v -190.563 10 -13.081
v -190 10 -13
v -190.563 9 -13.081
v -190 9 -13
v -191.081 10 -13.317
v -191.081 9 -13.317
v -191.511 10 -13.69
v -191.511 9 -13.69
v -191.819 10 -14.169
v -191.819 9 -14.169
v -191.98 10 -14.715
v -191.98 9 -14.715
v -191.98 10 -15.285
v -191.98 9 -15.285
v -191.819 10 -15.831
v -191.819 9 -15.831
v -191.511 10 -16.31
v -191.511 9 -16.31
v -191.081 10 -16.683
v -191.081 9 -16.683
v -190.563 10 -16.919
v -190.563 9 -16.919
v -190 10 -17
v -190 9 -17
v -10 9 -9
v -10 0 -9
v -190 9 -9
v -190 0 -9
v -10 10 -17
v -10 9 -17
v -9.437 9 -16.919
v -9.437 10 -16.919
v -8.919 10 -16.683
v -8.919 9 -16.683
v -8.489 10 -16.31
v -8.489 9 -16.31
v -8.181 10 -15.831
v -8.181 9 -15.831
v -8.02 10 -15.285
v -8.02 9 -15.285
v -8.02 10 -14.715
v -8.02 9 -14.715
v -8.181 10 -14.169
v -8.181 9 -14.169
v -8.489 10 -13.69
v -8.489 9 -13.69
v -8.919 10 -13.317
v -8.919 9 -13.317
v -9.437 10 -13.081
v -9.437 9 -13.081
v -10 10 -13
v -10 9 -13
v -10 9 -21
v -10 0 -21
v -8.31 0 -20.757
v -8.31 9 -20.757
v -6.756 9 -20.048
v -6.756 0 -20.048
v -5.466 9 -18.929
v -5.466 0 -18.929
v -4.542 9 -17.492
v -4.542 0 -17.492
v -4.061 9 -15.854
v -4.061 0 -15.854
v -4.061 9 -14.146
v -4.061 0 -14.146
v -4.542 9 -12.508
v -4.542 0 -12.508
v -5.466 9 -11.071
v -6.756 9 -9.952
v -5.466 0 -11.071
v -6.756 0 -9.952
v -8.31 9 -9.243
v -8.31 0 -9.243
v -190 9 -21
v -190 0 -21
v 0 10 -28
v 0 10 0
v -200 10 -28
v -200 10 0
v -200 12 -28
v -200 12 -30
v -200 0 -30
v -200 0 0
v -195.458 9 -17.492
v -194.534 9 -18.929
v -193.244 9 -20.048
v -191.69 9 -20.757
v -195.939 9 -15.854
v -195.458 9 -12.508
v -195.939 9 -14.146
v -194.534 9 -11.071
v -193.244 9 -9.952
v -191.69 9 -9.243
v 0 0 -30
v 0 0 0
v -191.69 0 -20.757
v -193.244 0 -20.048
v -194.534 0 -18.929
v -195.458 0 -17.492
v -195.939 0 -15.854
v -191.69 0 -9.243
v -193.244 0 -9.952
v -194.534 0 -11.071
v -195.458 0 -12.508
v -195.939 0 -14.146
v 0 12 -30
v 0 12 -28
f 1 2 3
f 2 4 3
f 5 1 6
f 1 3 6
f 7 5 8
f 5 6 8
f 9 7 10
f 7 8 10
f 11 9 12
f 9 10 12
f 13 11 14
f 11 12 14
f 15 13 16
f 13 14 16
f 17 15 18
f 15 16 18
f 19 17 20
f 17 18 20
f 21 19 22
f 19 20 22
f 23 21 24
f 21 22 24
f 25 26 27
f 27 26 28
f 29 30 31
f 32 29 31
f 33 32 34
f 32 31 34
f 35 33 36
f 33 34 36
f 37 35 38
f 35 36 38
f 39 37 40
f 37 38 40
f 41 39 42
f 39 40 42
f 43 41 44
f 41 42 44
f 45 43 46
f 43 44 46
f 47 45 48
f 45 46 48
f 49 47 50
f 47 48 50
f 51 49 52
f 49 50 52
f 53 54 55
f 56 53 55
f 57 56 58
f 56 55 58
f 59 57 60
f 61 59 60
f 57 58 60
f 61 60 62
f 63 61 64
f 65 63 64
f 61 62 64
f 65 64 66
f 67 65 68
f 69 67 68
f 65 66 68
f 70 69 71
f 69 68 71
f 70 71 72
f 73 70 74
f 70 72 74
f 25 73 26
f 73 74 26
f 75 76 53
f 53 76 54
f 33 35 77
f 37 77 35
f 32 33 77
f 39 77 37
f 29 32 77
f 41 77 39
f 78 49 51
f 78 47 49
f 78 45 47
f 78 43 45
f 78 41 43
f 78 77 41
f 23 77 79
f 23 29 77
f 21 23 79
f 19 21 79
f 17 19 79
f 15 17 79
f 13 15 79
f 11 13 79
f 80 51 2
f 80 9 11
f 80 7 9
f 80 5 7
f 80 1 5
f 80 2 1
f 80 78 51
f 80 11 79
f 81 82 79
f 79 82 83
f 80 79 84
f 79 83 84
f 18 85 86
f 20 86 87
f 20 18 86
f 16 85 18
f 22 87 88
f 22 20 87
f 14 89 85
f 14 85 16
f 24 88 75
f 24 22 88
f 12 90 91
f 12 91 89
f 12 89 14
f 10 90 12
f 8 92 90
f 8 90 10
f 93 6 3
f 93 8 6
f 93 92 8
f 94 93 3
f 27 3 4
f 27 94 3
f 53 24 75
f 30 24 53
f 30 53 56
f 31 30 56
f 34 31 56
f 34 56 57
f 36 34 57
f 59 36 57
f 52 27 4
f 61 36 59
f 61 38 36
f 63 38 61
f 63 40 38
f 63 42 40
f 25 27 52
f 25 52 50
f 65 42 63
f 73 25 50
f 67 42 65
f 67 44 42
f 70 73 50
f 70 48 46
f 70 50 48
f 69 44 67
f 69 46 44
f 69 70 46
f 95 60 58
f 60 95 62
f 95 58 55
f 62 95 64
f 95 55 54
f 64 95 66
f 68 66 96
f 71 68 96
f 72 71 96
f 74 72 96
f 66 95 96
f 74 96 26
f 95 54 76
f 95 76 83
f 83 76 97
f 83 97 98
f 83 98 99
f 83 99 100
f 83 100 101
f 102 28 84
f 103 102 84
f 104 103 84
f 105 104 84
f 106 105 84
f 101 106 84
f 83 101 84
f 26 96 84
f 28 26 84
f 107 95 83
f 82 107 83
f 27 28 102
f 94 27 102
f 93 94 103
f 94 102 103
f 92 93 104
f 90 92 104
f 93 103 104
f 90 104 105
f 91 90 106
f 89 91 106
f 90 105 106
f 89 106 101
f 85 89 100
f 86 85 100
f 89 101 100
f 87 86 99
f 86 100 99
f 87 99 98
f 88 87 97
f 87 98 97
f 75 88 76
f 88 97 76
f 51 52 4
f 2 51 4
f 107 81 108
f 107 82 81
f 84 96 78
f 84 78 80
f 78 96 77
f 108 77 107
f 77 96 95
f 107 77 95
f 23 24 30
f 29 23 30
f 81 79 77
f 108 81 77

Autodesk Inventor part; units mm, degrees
ref_plane "YZ Plane" through (0, 0, 0) normal (1, 0, 0) x (0, 1, 0)
ref_plane "XZ Plane" through (0, 0, 0) normal (0, 1, 0) x (-1, 0, 0)
ref_plane "XY Plane" through (0, 0, 0) normal (0, 0, 1) x (1, 0, 0)
sketch "Sketch1" plane through (0, 0, 0) normal (0, 1, 0) x (-1, 0, 0)
  line L0 (0, 0) -> (200, 0)
  line L1 (200, 0) -> (200, -30)
  line L2 (200, -30) -> (0, -30)
  line L3 (0, -30) -> (0, 0)
  line L4 (10, -15) -> (190, -15) construction
  line L5 (10, -13) -> (190, -13)
  line L6 (190, -17) -> (10, -17)
  arc A0 (10, -13) -> (10, -17) centre (10, -15) ccw
  arc A1 (190, -17) -> (190, -13) centre (190, -15) ccw
  point P0 (100, -15)
  dimension "d0" = 200
  dimension "d1" = 30
  dimension "d2" = 2
  dimension "d3" = 180
  dimension "d4" = 10
  dimension "d5" = 15
extrude "Extrusion1" add sketch "Sketch1" along normal blind 10
sketch "Sketch2" plane through (0, 0, 0) normal (0, -1, 0) x (1, 0, 0)
  arc A0 (-190, -13) -> (-190, -17) centre (-190, -15) ccw projected
  line L0 (-190, -15) -> (-10, -15) construction
  line L1 (-190, -17) -> (-10, -17) projected
  line L2 (-190, -21) -> (-10, -21)
  line L3 (-10, -9) -> (-190, -9)
  arc A1 (-190, -9) -> (-190, -21) centre (-190, -15) ccw
  arc A2 (-10, -21) -> (-10, -9) centre (-10, -15) ccw
  arc A3 (-10, -17) -> (-10, -13) centre (-10, -15) ccw projected
  point P0 (0, 0)
  point P1 (-100, -15)
  dimension "d10" = 12
extrude "Extrusion2" cut sketch "Sketch2" against normal blind 9
sketch "Sketch3" plane through (0, 10, 0) normal (0, 1, 0) x (1, 0, 0)
  line L0 (-200, 0) -> (0, 0) projected
  line L1 (0, 0) -> (0, 30) projected
  line L2 (0, 30) -> (-200, 30) projected
  line L3 (-200, 30) -> (-200, 0) projected
  line L4 (0, 30) -> (-200, 30)
  line L5 (-200, 30) -> (-200, 28)
  line L6 (-200, 28) -> (0, 28)
  line L7 (0, 28) -> (0, 30)
  point P0 (0, 28)
  dimension "d20" = 2
extrude "Extrusion3" add sketch "Sketch3" along normal blind 2 contours L3 L2 L1 L6
equation "\"d3\" = d0 - 2 * d4"
equation "\"d5\" = 0.5 * d1"
properties part number "SolderSupport" material "Aluminum"
